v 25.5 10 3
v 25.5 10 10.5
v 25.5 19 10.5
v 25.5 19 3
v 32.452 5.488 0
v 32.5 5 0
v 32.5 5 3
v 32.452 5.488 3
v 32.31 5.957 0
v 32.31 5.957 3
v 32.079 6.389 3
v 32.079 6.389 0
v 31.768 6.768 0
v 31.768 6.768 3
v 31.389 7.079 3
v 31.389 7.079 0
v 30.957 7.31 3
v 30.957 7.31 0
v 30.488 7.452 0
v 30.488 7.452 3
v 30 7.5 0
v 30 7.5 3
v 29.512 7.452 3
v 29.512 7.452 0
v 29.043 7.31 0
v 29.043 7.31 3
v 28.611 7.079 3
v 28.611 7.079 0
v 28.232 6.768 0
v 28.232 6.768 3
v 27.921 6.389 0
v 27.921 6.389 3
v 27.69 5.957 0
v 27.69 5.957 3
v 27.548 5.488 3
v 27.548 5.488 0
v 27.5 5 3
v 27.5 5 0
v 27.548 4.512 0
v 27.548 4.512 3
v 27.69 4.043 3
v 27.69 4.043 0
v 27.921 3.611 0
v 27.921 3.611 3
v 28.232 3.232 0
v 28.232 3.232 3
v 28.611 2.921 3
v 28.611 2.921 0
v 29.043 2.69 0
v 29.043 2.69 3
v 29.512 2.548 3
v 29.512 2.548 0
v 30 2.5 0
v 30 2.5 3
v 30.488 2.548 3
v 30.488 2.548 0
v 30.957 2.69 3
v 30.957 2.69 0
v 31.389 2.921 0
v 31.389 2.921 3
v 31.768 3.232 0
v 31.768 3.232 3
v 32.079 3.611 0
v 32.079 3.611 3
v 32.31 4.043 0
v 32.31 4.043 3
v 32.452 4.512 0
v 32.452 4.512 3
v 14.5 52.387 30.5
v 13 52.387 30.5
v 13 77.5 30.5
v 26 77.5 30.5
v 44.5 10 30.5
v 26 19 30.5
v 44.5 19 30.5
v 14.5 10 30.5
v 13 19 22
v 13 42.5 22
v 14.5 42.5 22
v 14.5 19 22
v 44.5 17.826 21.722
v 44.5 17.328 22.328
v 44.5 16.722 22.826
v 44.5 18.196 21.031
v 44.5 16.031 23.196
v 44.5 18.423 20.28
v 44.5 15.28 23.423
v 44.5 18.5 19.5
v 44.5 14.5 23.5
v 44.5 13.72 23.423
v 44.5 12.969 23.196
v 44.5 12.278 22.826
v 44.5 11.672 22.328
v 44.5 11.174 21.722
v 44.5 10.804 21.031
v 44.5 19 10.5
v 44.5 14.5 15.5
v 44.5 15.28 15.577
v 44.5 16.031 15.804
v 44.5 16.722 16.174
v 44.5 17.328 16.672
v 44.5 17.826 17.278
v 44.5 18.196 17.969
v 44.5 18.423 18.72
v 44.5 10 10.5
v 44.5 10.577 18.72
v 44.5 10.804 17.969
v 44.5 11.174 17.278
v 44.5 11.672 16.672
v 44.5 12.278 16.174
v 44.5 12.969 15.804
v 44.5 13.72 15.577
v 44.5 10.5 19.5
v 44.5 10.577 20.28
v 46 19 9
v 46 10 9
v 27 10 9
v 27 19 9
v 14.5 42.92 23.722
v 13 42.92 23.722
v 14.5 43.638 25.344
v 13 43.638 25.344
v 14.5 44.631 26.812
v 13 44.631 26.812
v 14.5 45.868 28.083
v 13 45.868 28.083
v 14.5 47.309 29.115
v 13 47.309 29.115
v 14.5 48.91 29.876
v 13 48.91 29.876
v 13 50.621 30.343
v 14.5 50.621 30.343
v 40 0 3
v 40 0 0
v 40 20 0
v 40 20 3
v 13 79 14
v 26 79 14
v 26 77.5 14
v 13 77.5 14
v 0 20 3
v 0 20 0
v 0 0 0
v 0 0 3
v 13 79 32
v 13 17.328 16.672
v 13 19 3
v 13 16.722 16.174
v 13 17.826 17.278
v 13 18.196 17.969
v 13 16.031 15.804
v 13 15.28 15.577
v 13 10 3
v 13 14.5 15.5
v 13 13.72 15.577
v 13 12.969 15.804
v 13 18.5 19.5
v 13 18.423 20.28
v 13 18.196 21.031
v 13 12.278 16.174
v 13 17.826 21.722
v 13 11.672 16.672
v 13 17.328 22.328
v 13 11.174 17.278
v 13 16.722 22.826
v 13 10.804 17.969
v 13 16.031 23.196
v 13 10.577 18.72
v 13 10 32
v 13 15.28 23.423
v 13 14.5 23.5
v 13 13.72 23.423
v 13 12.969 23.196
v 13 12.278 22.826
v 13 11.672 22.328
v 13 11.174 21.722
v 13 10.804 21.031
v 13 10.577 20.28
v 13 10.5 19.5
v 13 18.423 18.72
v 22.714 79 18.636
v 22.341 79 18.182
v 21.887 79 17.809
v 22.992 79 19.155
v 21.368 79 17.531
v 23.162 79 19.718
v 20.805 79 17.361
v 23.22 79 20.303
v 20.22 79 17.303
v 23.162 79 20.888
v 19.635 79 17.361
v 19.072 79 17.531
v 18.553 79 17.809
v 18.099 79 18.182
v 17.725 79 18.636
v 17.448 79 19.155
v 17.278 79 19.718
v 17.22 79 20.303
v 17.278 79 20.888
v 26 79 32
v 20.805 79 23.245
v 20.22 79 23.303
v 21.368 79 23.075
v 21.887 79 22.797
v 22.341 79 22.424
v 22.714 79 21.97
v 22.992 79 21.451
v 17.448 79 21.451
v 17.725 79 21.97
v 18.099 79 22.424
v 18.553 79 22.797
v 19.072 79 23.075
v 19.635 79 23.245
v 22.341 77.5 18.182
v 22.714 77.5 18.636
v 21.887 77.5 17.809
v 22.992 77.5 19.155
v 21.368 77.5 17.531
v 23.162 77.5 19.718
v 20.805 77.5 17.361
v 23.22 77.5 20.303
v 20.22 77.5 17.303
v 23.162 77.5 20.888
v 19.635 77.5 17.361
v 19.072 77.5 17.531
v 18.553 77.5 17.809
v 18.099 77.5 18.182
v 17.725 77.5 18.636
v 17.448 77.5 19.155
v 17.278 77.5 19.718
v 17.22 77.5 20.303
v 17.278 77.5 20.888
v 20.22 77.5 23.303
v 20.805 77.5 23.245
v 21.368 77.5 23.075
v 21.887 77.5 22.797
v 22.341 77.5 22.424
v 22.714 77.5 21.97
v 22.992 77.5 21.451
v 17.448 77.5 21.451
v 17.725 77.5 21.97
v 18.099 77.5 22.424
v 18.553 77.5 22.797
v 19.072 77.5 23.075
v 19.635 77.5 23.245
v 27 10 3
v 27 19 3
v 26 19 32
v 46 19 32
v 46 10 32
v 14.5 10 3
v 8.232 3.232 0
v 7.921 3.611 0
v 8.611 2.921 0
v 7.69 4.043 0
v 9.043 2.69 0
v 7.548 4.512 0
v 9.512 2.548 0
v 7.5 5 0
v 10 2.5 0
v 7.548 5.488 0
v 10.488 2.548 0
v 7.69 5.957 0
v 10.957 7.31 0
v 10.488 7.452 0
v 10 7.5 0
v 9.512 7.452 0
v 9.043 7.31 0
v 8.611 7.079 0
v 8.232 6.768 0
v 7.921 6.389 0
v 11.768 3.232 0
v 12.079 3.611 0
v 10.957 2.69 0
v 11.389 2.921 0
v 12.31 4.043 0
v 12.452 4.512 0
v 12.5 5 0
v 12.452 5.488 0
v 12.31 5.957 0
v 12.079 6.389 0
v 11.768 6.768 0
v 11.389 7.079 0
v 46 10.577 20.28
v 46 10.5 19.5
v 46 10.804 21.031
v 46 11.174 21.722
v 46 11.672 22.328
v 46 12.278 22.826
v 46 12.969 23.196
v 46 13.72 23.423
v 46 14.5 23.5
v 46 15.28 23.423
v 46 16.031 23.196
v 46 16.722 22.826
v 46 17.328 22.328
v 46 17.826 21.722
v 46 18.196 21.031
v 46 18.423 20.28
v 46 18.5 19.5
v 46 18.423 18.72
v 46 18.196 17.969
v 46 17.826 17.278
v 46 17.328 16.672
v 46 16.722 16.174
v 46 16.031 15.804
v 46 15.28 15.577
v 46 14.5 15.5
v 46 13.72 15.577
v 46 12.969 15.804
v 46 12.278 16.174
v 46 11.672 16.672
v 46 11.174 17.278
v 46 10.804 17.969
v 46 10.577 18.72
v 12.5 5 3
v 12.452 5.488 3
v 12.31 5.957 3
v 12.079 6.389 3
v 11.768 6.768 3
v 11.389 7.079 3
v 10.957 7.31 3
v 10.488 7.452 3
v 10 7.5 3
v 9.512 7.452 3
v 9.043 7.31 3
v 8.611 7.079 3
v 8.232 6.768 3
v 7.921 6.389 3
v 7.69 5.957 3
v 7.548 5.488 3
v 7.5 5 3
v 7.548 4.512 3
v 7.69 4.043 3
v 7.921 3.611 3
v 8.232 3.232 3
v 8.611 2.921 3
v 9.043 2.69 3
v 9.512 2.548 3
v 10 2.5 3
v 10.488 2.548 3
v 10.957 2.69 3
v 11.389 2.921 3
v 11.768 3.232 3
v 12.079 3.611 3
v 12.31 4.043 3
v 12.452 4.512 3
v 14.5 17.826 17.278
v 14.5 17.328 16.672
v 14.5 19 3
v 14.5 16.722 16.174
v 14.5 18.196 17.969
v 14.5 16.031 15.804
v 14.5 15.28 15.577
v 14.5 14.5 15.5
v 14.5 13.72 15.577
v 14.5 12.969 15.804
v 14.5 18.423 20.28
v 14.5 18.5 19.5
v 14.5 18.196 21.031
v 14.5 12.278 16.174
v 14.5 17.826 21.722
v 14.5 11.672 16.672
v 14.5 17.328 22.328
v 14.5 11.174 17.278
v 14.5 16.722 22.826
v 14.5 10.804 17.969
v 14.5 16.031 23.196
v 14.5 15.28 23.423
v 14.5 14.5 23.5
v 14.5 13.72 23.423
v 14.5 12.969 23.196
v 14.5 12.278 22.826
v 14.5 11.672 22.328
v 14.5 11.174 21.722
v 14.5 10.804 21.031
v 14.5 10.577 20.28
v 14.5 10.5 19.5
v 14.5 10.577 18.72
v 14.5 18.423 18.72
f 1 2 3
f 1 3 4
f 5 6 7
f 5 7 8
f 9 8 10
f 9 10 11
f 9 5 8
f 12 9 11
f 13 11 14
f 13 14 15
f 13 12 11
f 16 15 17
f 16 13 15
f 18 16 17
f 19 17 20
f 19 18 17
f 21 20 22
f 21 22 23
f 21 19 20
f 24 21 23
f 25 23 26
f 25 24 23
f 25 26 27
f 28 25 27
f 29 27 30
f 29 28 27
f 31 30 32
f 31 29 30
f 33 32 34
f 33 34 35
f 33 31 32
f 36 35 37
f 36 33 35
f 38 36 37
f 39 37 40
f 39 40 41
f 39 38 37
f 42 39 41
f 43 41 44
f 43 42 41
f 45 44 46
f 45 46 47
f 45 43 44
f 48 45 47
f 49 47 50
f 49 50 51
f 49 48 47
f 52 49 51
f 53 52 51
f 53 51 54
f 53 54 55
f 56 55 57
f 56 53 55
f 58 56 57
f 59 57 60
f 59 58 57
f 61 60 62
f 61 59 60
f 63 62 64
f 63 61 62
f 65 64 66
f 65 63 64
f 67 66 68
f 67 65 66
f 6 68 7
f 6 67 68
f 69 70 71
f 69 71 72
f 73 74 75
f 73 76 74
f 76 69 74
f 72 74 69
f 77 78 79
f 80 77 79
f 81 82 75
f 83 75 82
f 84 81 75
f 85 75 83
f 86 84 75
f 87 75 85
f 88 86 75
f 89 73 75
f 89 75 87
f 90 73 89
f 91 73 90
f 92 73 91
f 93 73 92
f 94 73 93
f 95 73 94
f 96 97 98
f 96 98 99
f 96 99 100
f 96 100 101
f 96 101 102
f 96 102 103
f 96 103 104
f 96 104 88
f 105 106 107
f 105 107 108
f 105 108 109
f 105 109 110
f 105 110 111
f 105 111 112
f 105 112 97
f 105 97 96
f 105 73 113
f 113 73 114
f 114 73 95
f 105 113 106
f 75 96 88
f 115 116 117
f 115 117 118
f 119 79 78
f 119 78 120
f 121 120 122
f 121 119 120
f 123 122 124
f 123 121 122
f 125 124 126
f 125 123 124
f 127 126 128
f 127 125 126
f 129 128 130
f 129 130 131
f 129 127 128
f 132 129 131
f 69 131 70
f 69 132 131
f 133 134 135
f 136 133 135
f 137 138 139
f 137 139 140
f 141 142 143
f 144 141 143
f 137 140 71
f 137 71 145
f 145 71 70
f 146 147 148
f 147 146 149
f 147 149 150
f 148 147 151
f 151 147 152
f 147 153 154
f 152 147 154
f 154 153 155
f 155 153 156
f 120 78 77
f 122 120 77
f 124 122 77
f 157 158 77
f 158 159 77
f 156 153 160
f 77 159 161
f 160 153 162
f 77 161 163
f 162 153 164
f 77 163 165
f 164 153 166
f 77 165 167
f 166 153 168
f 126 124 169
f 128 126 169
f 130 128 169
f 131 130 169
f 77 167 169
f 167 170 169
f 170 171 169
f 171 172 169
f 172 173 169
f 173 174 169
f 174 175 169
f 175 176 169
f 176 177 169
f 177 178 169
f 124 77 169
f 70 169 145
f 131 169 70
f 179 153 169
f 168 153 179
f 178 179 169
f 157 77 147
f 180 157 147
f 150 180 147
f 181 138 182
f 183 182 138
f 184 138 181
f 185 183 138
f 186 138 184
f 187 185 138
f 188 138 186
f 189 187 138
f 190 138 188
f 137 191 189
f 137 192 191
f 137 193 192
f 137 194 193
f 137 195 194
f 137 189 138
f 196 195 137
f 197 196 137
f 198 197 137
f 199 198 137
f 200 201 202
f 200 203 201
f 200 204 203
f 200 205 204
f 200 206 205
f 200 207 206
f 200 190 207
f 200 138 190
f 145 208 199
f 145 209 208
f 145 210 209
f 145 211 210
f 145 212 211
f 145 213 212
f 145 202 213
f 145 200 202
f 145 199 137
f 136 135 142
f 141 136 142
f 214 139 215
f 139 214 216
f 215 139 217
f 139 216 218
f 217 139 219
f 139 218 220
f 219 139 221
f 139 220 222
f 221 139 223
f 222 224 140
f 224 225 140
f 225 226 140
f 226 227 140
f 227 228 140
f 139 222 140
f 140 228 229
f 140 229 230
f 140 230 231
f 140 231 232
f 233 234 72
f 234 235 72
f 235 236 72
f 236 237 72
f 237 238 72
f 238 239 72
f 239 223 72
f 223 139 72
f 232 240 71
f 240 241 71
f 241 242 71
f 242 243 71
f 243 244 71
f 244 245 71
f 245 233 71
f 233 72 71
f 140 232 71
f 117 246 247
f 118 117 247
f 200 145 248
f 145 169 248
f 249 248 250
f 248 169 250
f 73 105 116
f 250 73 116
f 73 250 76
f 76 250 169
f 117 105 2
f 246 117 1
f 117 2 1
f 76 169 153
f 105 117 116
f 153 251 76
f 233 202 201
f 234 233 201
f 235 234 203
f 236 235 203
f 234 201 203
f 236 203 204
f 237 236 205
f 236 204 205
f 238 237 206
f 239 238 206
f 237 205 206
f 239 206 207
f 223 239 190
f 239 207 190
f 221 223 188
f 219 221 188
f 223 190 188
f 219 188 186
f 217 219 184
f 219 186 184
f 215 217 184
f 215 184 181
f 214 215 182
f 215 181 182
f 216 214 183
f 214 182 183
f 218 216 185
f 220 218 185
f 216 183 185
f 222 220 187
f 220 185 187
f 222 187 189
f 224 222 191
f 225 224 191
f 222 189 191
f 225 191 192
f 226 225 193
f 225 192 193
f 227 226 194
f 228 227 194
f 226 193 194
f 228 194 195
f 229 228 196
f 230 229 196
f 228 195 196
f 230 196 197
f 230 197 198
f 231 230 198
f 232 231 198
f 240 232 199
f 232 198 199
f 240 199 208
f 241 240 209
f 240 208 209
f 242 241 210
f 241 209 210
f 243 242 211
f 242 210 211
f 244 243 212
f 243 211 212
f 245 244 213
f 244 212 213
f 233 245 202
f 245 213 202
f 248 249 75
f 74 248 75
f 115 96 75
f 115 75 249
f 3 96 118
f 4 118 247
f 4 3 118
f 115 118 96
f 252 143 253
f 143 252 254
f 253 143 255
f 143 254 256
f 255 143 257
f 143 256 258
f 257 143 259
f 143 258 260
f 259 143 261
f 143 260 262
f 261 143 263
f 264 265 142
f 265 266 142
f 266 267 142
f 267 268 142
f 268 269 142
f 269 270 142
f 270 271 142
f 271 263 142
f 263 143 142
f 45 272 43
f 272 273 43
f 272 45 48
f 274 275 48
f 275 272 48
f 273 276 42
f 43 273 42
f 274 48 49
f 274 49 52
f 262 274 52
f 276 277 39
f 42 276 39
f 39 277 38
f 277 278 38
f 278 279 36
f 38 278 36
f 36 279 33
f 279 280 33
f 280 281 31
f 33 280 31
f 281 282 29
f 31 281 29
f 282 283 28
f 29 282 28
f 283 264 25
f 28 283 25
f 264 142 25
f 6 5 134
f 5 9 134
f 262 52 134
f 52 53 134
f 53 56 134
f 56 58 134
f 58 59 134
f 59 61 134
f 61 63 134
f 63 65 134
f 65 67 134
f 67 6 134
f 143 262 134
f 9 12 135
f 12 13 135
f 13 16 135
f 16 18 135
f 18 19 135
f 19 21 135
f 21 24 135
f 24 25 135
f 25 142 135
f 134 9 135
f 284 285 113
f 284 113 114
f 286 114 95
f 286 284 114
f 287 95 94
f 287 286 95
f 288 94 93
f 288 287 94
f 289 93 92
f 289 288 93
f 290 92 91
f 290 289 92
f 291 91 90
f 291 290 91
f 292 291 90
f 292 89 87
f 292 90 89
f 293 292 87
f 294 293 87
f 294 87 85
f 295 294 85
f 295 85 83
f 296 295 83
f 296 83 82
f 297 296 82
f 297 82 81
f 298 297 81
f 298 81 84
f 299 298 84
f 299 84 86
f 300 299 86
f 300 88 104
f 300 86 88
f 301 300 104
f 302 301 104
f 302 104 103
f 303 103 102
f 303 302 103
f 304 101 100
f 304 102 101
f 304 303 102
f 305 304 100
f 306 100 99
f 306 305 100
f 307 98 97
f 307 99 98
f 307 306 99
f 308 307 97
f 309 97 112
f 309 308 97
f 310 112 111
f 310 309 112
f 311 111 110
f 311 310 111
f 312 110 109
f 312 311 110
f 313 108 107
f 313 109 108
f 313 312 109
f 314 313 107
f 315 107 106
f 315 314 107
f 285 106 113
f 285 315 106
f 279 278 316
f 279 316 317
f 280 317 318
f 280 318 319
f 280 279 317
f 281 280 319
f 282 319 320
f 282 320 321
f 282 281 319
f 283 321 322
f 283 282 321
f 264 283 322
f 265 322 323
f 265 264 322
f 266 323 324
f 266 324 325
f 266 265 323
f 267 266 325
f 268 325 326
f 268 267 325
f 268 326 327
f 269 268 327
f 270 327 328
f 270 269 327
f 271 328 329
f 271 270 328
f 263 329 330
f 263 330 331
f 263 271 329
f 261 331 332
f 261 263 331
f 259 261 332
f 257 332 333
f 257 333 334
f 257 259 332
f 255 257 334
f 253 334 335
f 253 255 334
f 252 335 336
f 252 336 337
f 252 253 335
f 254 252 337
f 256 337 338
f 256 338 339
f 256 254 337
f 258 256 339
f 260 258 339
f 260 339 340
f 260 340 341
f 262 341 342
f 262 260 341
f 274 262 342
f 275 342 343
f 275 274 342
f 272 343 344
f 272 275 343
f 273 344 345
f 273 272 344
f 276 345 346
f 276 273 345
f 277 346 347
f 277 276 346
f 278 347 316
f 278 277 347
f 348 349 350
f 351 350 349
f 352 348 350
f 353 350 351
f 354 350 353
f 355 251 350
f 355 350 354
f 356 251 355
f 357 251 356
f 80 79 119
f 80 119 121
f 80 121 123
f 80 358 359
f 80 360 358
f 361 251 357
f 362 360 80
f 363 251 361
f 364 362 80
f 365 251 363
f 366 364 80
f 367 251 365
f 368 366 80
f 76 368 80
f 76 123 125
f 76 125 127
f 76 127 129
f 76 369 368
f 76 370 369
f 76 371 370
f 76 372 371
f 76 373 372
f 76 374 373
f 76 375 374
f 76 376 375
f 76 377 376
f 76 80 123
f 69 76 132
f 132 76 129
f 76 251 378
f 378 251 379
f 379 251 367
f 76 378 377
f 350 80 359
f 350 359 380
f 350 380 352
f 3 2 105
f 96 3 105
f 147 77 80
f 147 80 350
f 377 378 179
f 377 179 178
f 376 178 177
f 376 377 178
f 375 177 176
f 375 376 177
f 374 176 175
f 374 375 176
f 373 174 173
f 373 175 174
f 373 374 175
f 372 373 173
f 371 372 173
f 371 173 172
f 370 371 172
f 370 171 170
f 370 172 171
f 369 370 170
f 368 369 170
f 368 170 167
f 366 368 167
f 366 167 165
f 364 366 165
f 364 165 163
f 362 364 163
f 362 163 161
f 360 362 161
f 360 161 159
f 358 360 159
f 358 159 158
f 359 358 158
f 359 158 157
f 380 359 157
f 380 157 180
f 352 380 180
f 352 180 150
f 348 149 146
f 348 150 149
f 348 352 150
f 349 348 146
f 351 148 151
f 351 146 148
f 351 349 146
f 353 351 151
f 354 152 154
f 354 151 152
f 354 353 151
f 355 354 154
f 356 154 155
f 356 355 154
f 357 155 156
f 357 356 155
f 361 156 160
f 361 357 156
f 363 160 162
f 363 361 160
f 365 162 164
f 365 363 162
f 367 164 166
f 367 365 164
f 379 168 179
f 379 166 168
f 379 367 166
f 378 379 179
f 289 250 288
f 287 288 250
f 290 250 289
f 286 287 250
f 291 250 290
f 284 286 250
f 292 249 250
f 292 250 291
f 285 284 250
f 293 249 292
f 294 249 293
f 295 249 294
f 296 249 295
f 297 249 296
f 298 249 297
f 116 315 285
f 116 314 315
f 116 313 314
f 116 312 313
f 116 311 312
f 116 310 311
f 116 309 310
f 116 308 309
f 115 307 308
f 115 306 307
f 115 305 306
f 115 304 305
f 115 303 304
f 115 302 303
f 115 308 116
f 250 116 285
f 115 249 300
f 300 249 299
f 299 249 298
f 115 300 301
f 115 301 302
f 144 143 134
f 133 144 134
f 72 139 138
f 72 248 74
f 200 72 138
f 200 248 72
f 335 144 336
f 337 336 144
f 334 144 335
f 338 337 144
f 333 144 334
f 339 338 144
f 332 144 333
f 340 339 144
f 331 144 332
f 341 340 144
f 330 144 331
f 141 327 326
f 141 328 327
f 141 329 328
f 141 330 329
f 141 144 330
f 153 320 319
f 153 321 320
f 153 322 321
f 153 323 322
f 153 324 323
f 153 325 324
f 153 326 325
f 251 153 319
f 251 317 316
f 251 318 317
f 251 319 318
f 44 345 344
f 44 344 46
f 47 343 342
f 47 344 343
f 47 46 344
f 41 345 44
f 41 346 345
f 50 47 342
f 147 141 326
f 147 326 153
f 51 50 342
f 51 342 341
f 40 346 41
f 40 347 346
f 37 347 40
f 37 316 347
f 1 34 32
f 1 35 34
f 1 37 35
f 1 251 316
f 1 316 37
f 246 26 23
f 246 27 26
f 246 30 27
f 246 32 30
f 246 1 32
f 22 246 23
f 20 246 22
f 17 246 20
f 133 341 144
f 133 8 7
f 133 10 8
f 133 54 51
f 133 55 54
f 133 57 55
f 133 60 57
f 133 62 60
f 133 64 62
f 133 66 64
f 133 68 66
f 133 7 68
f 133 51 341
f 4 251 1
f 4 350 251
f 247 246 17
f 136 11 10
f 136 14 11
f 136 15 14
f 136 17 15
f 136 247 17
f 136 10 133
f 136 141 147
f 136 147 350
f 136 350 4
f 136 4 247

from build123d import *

# Parameters (mm, degrees)
SKETCH1_W               = 7
SKETCH1_H               = 9
BOSS_EXTRUDE2_DEPTH     = 32
SKETCH1_4_R             = 2.5
BOSS_EXTRUDE3_DEPTH     = 3
CUT_EXTRUDE1_DEPTH      = 55.635153519
CUT_EXTRUDE1_DEPTH_BACK = 55.635153519
SKETCH3_W               = 11
SKETCH3_H               = 27.5
SKETCH6_W               = 23
SKETCH6_H               = 9
BOSS_EXTRUDE4_DEPTH     = 19
CUT_EXTRUDE3_DEPTH      = 60.16924877
CUT_EXTRUDE3_DEPTH_BACK = 60.16924877
SKETCH9_W               = 19
SKETCH9_H               = 20
CUT_EXTRUDE4_DEPTH      = 51.129831438
CUT_EXTRUDE4_DEPTH_BACK = 51.129831438
SKETCH12_R              = 4
SKETCH14_W              = 13
SKETCH14_H              = 10
BOSS_EXTRUDE6_DEPTH     = 60
SKETCH17_W              = 11.5
SKETCH17_H              = 8.5
CUT_EXTRUDE6_DEPTH      = 58.5
SKETCH18_W              = 13
SKETCH18_H              = 1.5
BOSS_EXTRUDE7_DEPTH     = 8
SKETCH19_R              = 3
CUT_EXTRUDE7_DEPTH      = 1.5
SKETCH20_W              = 8.5
SKETCH20_H              = 35
CUT_EXTRUDE8_DEPTH      = 1.5
FILLET1_R               = 10


with BuildPart() as part:
    # Sketch1 → Boss-Extrude2 (new body)
    with BuildSketch(Plane.XY):
        with Locations((23.5, 14.5)):
            Rectangle(SKETCH1_W, SKETCH1_H)
        with Locations((16.5, 14.5)):
            Rectangle(SKETCH1_W, SKETCH1_H)
    extrude(amount=BOSS_EXTRUDE2_DEPTH)

    # Sketch1<4> → Boss-Extrude3 (add)
    # profile 1 of 2: a face of its own
    with BuildSketch(Plane.XY):
        Polygon((0, 0), (20, 0), (20, 10), (13, 10), (13, 19), (20, 19), (20, 20), (0, 20), align=None)
        with Locations((10, 5)):
            Circle(SKETCH1_4_R, mode=Mode.SUBTRACT)
    # profile 2 of 2: a face of its own
    with BuildSketch(Plane.XY):
        Polygon((20, 10), (20, 0), (40, 0), (40, 20), (20, 20), (20, 19), (27, 19), (27, 10), align=None)
        with Locations((30, 5)):
            Circle(SKETCH1_4_R, mode=Mode.SUBTRACT)
    extrude(amount=BOSS_EXTRUDE3_DEPTH)

    # Sketch3 → Cut-Extrude1 (cut, two sides: drawn at the far end of the back side and taken through both)
    with BuildSketch(Plane(origin=(0, 19, 0), x_dir=(1, 0, 0), z_dir=(0, 1, 0)).offset(-CUT_EXTRUDE1_DEPTH_BACK)):
        with Locations((20, -16.75)):
            Rectangle(SKETCH3_W, SKETCH3_H)
    extrude(amount=CUT_EXTRUDE1_DEPTH + CUT_EXTRUDE1_DEPTH_BACK, mode=Mode.SUBTRACT)

    # Sketch6 → Boss-Extrude4 (add)
    with BuildSketch(Plane(origin=(27, 0, 0), x_dir=(0, 0, -1), z_dir=(1, 0, 0))):
        with Locations((-20.5, 14.5)):
            Rectangle(SKETCH6_W, SKETCH6_H)
    extrude(amount=BOSS_EXTRUDE4_DEPTH)

    # Sketch9 → Cut-Extrude3 (cut, two sides: drawn at the far end of the back side and taken through both)
    with BuildSketch(Plane(origin=(0, 19, 0), x_dir=(1, 0, 0), z_dir=(0, 1, 0)).offset(-CUT_EXTRUDE3_DEPTH_BACK)):
        with Locations((35, -20.5)):
            Rectangle(SKETCH9_W, SKETCH9_H)
    extrude(amount=CUT_EXTRUDE3_DEPTH + CUT_EXTRUDE3_DEPTH_BACK, mode=Mode.SUBTRACT)

    # Sketch12 → Cut-Extrude4 (cut, two sides: drawn at the far end of the back side and taken through both)
    with BuildSketch(Plane.ZY.offset(-13).offset(-CUT_EXTRUDE4_DEPTH_BACK)):
        with Locations(Location((19.5, 14.5, 0), (0, 0, 270))):
            Circle(SKETCH12_R)
    extrude(amount=CUT_EXTRUDE4_DEPTH + CUT_EXTRUDE4_DEPTH_BACK, mode=Mode.SUBTRACT)

    # Sketch14 → Boss-Extrude6 (add)
    with BuildSketch(Plane(origin=(0, 19, 0), x_dir=(1, 0, 0), z_dir=(0, 1, 0))):
        with Locations((19.5, -27)):
            Rectangle(SKETCH14_W, SKETCH14_H)
    extrude(amount=BOSS_EXTRUDE6_DEPTH)

    # Sketch17 → Cut-Extrude6 (cut)
    with BuildSketch(Plane.XZ.offset(-19)):
        with Locations((20.25, 26.25)):
            Rectangle(SKETCH17_W, SKETCH17_H)
    extrude(amount=-CUT_EXTRUDE6_DEPTH, mode=Mode.SUBTRACT)

    # Sketch18 → Boss-Extrude7 (add)
    with BuildSketch(Plane(origin=(0, 0, 22), x_dir=(-1, 0, 0), z_dir=(0, 0, -1))):
        with Locations((-19.5, 78.25)):
            Rectangle(SKETCH18_W, SKETCH18_H)
    extrude(amount=BOSS_EXTRUDE7_DEPTH)

    # Sketch19 → Cut-Extrude7 (cut)
    with BuildSketch(Plane(origin=(0, 79, 0), x_dir=(1, 0, 0), z_dir=(0, 1, 0))):
        with Locations(Location((20.2198624, -20.303001359, 0), (0, 0, 270))):
            Circle(SKETCH19_R)
    extrude(amount=-CUT_EXTRUDE7_DEPTH, mode=Mode.SUBTRACT)

    # Sketch20 → Cut-Extrude8 (cut)
    with BuildSketch(Plane(origin=(14.5, 0, 0), x_dir=(0, 0, -1), z_dir=(1, 0, 0))):
        with Locations((-26.25, 60)):
            Rectangle(SKETCH20_W, SKETCH20_H)
    extrude(amount=-CUT_EXTRUDE8_DEPTH, mode=Mode.SUBTRACT)

    # Fillet1
    # the kernel refuses this fillet: 10 mm, written as the material it adds along each edge
    with BuildSketch(Plane(origin=(14.5, 42.5, 30.5), x_dir=(0, 0, -1), z_dir=(-1, 0, 0))) as fillet1_piece_1:
        with BuildLine():
            CenterArc((10, -9.886859967), FILLET1_R, 98.626926559, 81.373073441)
            Line((0, -9.886859967), (-0.2, -9.886859967))
            Line((-0.2, -9.886859967), (-0.2, 0))
            Line((-0.2, 0), (0, 0.2))
            ThreePointArc((0, 0.2), (4.25, 0.2), (8.47, 0.197737199))
            Line((8.47, 0.197737199), (8.5, 0))
        make_face()
    extrude(amount=1.5)


solid = part.part
